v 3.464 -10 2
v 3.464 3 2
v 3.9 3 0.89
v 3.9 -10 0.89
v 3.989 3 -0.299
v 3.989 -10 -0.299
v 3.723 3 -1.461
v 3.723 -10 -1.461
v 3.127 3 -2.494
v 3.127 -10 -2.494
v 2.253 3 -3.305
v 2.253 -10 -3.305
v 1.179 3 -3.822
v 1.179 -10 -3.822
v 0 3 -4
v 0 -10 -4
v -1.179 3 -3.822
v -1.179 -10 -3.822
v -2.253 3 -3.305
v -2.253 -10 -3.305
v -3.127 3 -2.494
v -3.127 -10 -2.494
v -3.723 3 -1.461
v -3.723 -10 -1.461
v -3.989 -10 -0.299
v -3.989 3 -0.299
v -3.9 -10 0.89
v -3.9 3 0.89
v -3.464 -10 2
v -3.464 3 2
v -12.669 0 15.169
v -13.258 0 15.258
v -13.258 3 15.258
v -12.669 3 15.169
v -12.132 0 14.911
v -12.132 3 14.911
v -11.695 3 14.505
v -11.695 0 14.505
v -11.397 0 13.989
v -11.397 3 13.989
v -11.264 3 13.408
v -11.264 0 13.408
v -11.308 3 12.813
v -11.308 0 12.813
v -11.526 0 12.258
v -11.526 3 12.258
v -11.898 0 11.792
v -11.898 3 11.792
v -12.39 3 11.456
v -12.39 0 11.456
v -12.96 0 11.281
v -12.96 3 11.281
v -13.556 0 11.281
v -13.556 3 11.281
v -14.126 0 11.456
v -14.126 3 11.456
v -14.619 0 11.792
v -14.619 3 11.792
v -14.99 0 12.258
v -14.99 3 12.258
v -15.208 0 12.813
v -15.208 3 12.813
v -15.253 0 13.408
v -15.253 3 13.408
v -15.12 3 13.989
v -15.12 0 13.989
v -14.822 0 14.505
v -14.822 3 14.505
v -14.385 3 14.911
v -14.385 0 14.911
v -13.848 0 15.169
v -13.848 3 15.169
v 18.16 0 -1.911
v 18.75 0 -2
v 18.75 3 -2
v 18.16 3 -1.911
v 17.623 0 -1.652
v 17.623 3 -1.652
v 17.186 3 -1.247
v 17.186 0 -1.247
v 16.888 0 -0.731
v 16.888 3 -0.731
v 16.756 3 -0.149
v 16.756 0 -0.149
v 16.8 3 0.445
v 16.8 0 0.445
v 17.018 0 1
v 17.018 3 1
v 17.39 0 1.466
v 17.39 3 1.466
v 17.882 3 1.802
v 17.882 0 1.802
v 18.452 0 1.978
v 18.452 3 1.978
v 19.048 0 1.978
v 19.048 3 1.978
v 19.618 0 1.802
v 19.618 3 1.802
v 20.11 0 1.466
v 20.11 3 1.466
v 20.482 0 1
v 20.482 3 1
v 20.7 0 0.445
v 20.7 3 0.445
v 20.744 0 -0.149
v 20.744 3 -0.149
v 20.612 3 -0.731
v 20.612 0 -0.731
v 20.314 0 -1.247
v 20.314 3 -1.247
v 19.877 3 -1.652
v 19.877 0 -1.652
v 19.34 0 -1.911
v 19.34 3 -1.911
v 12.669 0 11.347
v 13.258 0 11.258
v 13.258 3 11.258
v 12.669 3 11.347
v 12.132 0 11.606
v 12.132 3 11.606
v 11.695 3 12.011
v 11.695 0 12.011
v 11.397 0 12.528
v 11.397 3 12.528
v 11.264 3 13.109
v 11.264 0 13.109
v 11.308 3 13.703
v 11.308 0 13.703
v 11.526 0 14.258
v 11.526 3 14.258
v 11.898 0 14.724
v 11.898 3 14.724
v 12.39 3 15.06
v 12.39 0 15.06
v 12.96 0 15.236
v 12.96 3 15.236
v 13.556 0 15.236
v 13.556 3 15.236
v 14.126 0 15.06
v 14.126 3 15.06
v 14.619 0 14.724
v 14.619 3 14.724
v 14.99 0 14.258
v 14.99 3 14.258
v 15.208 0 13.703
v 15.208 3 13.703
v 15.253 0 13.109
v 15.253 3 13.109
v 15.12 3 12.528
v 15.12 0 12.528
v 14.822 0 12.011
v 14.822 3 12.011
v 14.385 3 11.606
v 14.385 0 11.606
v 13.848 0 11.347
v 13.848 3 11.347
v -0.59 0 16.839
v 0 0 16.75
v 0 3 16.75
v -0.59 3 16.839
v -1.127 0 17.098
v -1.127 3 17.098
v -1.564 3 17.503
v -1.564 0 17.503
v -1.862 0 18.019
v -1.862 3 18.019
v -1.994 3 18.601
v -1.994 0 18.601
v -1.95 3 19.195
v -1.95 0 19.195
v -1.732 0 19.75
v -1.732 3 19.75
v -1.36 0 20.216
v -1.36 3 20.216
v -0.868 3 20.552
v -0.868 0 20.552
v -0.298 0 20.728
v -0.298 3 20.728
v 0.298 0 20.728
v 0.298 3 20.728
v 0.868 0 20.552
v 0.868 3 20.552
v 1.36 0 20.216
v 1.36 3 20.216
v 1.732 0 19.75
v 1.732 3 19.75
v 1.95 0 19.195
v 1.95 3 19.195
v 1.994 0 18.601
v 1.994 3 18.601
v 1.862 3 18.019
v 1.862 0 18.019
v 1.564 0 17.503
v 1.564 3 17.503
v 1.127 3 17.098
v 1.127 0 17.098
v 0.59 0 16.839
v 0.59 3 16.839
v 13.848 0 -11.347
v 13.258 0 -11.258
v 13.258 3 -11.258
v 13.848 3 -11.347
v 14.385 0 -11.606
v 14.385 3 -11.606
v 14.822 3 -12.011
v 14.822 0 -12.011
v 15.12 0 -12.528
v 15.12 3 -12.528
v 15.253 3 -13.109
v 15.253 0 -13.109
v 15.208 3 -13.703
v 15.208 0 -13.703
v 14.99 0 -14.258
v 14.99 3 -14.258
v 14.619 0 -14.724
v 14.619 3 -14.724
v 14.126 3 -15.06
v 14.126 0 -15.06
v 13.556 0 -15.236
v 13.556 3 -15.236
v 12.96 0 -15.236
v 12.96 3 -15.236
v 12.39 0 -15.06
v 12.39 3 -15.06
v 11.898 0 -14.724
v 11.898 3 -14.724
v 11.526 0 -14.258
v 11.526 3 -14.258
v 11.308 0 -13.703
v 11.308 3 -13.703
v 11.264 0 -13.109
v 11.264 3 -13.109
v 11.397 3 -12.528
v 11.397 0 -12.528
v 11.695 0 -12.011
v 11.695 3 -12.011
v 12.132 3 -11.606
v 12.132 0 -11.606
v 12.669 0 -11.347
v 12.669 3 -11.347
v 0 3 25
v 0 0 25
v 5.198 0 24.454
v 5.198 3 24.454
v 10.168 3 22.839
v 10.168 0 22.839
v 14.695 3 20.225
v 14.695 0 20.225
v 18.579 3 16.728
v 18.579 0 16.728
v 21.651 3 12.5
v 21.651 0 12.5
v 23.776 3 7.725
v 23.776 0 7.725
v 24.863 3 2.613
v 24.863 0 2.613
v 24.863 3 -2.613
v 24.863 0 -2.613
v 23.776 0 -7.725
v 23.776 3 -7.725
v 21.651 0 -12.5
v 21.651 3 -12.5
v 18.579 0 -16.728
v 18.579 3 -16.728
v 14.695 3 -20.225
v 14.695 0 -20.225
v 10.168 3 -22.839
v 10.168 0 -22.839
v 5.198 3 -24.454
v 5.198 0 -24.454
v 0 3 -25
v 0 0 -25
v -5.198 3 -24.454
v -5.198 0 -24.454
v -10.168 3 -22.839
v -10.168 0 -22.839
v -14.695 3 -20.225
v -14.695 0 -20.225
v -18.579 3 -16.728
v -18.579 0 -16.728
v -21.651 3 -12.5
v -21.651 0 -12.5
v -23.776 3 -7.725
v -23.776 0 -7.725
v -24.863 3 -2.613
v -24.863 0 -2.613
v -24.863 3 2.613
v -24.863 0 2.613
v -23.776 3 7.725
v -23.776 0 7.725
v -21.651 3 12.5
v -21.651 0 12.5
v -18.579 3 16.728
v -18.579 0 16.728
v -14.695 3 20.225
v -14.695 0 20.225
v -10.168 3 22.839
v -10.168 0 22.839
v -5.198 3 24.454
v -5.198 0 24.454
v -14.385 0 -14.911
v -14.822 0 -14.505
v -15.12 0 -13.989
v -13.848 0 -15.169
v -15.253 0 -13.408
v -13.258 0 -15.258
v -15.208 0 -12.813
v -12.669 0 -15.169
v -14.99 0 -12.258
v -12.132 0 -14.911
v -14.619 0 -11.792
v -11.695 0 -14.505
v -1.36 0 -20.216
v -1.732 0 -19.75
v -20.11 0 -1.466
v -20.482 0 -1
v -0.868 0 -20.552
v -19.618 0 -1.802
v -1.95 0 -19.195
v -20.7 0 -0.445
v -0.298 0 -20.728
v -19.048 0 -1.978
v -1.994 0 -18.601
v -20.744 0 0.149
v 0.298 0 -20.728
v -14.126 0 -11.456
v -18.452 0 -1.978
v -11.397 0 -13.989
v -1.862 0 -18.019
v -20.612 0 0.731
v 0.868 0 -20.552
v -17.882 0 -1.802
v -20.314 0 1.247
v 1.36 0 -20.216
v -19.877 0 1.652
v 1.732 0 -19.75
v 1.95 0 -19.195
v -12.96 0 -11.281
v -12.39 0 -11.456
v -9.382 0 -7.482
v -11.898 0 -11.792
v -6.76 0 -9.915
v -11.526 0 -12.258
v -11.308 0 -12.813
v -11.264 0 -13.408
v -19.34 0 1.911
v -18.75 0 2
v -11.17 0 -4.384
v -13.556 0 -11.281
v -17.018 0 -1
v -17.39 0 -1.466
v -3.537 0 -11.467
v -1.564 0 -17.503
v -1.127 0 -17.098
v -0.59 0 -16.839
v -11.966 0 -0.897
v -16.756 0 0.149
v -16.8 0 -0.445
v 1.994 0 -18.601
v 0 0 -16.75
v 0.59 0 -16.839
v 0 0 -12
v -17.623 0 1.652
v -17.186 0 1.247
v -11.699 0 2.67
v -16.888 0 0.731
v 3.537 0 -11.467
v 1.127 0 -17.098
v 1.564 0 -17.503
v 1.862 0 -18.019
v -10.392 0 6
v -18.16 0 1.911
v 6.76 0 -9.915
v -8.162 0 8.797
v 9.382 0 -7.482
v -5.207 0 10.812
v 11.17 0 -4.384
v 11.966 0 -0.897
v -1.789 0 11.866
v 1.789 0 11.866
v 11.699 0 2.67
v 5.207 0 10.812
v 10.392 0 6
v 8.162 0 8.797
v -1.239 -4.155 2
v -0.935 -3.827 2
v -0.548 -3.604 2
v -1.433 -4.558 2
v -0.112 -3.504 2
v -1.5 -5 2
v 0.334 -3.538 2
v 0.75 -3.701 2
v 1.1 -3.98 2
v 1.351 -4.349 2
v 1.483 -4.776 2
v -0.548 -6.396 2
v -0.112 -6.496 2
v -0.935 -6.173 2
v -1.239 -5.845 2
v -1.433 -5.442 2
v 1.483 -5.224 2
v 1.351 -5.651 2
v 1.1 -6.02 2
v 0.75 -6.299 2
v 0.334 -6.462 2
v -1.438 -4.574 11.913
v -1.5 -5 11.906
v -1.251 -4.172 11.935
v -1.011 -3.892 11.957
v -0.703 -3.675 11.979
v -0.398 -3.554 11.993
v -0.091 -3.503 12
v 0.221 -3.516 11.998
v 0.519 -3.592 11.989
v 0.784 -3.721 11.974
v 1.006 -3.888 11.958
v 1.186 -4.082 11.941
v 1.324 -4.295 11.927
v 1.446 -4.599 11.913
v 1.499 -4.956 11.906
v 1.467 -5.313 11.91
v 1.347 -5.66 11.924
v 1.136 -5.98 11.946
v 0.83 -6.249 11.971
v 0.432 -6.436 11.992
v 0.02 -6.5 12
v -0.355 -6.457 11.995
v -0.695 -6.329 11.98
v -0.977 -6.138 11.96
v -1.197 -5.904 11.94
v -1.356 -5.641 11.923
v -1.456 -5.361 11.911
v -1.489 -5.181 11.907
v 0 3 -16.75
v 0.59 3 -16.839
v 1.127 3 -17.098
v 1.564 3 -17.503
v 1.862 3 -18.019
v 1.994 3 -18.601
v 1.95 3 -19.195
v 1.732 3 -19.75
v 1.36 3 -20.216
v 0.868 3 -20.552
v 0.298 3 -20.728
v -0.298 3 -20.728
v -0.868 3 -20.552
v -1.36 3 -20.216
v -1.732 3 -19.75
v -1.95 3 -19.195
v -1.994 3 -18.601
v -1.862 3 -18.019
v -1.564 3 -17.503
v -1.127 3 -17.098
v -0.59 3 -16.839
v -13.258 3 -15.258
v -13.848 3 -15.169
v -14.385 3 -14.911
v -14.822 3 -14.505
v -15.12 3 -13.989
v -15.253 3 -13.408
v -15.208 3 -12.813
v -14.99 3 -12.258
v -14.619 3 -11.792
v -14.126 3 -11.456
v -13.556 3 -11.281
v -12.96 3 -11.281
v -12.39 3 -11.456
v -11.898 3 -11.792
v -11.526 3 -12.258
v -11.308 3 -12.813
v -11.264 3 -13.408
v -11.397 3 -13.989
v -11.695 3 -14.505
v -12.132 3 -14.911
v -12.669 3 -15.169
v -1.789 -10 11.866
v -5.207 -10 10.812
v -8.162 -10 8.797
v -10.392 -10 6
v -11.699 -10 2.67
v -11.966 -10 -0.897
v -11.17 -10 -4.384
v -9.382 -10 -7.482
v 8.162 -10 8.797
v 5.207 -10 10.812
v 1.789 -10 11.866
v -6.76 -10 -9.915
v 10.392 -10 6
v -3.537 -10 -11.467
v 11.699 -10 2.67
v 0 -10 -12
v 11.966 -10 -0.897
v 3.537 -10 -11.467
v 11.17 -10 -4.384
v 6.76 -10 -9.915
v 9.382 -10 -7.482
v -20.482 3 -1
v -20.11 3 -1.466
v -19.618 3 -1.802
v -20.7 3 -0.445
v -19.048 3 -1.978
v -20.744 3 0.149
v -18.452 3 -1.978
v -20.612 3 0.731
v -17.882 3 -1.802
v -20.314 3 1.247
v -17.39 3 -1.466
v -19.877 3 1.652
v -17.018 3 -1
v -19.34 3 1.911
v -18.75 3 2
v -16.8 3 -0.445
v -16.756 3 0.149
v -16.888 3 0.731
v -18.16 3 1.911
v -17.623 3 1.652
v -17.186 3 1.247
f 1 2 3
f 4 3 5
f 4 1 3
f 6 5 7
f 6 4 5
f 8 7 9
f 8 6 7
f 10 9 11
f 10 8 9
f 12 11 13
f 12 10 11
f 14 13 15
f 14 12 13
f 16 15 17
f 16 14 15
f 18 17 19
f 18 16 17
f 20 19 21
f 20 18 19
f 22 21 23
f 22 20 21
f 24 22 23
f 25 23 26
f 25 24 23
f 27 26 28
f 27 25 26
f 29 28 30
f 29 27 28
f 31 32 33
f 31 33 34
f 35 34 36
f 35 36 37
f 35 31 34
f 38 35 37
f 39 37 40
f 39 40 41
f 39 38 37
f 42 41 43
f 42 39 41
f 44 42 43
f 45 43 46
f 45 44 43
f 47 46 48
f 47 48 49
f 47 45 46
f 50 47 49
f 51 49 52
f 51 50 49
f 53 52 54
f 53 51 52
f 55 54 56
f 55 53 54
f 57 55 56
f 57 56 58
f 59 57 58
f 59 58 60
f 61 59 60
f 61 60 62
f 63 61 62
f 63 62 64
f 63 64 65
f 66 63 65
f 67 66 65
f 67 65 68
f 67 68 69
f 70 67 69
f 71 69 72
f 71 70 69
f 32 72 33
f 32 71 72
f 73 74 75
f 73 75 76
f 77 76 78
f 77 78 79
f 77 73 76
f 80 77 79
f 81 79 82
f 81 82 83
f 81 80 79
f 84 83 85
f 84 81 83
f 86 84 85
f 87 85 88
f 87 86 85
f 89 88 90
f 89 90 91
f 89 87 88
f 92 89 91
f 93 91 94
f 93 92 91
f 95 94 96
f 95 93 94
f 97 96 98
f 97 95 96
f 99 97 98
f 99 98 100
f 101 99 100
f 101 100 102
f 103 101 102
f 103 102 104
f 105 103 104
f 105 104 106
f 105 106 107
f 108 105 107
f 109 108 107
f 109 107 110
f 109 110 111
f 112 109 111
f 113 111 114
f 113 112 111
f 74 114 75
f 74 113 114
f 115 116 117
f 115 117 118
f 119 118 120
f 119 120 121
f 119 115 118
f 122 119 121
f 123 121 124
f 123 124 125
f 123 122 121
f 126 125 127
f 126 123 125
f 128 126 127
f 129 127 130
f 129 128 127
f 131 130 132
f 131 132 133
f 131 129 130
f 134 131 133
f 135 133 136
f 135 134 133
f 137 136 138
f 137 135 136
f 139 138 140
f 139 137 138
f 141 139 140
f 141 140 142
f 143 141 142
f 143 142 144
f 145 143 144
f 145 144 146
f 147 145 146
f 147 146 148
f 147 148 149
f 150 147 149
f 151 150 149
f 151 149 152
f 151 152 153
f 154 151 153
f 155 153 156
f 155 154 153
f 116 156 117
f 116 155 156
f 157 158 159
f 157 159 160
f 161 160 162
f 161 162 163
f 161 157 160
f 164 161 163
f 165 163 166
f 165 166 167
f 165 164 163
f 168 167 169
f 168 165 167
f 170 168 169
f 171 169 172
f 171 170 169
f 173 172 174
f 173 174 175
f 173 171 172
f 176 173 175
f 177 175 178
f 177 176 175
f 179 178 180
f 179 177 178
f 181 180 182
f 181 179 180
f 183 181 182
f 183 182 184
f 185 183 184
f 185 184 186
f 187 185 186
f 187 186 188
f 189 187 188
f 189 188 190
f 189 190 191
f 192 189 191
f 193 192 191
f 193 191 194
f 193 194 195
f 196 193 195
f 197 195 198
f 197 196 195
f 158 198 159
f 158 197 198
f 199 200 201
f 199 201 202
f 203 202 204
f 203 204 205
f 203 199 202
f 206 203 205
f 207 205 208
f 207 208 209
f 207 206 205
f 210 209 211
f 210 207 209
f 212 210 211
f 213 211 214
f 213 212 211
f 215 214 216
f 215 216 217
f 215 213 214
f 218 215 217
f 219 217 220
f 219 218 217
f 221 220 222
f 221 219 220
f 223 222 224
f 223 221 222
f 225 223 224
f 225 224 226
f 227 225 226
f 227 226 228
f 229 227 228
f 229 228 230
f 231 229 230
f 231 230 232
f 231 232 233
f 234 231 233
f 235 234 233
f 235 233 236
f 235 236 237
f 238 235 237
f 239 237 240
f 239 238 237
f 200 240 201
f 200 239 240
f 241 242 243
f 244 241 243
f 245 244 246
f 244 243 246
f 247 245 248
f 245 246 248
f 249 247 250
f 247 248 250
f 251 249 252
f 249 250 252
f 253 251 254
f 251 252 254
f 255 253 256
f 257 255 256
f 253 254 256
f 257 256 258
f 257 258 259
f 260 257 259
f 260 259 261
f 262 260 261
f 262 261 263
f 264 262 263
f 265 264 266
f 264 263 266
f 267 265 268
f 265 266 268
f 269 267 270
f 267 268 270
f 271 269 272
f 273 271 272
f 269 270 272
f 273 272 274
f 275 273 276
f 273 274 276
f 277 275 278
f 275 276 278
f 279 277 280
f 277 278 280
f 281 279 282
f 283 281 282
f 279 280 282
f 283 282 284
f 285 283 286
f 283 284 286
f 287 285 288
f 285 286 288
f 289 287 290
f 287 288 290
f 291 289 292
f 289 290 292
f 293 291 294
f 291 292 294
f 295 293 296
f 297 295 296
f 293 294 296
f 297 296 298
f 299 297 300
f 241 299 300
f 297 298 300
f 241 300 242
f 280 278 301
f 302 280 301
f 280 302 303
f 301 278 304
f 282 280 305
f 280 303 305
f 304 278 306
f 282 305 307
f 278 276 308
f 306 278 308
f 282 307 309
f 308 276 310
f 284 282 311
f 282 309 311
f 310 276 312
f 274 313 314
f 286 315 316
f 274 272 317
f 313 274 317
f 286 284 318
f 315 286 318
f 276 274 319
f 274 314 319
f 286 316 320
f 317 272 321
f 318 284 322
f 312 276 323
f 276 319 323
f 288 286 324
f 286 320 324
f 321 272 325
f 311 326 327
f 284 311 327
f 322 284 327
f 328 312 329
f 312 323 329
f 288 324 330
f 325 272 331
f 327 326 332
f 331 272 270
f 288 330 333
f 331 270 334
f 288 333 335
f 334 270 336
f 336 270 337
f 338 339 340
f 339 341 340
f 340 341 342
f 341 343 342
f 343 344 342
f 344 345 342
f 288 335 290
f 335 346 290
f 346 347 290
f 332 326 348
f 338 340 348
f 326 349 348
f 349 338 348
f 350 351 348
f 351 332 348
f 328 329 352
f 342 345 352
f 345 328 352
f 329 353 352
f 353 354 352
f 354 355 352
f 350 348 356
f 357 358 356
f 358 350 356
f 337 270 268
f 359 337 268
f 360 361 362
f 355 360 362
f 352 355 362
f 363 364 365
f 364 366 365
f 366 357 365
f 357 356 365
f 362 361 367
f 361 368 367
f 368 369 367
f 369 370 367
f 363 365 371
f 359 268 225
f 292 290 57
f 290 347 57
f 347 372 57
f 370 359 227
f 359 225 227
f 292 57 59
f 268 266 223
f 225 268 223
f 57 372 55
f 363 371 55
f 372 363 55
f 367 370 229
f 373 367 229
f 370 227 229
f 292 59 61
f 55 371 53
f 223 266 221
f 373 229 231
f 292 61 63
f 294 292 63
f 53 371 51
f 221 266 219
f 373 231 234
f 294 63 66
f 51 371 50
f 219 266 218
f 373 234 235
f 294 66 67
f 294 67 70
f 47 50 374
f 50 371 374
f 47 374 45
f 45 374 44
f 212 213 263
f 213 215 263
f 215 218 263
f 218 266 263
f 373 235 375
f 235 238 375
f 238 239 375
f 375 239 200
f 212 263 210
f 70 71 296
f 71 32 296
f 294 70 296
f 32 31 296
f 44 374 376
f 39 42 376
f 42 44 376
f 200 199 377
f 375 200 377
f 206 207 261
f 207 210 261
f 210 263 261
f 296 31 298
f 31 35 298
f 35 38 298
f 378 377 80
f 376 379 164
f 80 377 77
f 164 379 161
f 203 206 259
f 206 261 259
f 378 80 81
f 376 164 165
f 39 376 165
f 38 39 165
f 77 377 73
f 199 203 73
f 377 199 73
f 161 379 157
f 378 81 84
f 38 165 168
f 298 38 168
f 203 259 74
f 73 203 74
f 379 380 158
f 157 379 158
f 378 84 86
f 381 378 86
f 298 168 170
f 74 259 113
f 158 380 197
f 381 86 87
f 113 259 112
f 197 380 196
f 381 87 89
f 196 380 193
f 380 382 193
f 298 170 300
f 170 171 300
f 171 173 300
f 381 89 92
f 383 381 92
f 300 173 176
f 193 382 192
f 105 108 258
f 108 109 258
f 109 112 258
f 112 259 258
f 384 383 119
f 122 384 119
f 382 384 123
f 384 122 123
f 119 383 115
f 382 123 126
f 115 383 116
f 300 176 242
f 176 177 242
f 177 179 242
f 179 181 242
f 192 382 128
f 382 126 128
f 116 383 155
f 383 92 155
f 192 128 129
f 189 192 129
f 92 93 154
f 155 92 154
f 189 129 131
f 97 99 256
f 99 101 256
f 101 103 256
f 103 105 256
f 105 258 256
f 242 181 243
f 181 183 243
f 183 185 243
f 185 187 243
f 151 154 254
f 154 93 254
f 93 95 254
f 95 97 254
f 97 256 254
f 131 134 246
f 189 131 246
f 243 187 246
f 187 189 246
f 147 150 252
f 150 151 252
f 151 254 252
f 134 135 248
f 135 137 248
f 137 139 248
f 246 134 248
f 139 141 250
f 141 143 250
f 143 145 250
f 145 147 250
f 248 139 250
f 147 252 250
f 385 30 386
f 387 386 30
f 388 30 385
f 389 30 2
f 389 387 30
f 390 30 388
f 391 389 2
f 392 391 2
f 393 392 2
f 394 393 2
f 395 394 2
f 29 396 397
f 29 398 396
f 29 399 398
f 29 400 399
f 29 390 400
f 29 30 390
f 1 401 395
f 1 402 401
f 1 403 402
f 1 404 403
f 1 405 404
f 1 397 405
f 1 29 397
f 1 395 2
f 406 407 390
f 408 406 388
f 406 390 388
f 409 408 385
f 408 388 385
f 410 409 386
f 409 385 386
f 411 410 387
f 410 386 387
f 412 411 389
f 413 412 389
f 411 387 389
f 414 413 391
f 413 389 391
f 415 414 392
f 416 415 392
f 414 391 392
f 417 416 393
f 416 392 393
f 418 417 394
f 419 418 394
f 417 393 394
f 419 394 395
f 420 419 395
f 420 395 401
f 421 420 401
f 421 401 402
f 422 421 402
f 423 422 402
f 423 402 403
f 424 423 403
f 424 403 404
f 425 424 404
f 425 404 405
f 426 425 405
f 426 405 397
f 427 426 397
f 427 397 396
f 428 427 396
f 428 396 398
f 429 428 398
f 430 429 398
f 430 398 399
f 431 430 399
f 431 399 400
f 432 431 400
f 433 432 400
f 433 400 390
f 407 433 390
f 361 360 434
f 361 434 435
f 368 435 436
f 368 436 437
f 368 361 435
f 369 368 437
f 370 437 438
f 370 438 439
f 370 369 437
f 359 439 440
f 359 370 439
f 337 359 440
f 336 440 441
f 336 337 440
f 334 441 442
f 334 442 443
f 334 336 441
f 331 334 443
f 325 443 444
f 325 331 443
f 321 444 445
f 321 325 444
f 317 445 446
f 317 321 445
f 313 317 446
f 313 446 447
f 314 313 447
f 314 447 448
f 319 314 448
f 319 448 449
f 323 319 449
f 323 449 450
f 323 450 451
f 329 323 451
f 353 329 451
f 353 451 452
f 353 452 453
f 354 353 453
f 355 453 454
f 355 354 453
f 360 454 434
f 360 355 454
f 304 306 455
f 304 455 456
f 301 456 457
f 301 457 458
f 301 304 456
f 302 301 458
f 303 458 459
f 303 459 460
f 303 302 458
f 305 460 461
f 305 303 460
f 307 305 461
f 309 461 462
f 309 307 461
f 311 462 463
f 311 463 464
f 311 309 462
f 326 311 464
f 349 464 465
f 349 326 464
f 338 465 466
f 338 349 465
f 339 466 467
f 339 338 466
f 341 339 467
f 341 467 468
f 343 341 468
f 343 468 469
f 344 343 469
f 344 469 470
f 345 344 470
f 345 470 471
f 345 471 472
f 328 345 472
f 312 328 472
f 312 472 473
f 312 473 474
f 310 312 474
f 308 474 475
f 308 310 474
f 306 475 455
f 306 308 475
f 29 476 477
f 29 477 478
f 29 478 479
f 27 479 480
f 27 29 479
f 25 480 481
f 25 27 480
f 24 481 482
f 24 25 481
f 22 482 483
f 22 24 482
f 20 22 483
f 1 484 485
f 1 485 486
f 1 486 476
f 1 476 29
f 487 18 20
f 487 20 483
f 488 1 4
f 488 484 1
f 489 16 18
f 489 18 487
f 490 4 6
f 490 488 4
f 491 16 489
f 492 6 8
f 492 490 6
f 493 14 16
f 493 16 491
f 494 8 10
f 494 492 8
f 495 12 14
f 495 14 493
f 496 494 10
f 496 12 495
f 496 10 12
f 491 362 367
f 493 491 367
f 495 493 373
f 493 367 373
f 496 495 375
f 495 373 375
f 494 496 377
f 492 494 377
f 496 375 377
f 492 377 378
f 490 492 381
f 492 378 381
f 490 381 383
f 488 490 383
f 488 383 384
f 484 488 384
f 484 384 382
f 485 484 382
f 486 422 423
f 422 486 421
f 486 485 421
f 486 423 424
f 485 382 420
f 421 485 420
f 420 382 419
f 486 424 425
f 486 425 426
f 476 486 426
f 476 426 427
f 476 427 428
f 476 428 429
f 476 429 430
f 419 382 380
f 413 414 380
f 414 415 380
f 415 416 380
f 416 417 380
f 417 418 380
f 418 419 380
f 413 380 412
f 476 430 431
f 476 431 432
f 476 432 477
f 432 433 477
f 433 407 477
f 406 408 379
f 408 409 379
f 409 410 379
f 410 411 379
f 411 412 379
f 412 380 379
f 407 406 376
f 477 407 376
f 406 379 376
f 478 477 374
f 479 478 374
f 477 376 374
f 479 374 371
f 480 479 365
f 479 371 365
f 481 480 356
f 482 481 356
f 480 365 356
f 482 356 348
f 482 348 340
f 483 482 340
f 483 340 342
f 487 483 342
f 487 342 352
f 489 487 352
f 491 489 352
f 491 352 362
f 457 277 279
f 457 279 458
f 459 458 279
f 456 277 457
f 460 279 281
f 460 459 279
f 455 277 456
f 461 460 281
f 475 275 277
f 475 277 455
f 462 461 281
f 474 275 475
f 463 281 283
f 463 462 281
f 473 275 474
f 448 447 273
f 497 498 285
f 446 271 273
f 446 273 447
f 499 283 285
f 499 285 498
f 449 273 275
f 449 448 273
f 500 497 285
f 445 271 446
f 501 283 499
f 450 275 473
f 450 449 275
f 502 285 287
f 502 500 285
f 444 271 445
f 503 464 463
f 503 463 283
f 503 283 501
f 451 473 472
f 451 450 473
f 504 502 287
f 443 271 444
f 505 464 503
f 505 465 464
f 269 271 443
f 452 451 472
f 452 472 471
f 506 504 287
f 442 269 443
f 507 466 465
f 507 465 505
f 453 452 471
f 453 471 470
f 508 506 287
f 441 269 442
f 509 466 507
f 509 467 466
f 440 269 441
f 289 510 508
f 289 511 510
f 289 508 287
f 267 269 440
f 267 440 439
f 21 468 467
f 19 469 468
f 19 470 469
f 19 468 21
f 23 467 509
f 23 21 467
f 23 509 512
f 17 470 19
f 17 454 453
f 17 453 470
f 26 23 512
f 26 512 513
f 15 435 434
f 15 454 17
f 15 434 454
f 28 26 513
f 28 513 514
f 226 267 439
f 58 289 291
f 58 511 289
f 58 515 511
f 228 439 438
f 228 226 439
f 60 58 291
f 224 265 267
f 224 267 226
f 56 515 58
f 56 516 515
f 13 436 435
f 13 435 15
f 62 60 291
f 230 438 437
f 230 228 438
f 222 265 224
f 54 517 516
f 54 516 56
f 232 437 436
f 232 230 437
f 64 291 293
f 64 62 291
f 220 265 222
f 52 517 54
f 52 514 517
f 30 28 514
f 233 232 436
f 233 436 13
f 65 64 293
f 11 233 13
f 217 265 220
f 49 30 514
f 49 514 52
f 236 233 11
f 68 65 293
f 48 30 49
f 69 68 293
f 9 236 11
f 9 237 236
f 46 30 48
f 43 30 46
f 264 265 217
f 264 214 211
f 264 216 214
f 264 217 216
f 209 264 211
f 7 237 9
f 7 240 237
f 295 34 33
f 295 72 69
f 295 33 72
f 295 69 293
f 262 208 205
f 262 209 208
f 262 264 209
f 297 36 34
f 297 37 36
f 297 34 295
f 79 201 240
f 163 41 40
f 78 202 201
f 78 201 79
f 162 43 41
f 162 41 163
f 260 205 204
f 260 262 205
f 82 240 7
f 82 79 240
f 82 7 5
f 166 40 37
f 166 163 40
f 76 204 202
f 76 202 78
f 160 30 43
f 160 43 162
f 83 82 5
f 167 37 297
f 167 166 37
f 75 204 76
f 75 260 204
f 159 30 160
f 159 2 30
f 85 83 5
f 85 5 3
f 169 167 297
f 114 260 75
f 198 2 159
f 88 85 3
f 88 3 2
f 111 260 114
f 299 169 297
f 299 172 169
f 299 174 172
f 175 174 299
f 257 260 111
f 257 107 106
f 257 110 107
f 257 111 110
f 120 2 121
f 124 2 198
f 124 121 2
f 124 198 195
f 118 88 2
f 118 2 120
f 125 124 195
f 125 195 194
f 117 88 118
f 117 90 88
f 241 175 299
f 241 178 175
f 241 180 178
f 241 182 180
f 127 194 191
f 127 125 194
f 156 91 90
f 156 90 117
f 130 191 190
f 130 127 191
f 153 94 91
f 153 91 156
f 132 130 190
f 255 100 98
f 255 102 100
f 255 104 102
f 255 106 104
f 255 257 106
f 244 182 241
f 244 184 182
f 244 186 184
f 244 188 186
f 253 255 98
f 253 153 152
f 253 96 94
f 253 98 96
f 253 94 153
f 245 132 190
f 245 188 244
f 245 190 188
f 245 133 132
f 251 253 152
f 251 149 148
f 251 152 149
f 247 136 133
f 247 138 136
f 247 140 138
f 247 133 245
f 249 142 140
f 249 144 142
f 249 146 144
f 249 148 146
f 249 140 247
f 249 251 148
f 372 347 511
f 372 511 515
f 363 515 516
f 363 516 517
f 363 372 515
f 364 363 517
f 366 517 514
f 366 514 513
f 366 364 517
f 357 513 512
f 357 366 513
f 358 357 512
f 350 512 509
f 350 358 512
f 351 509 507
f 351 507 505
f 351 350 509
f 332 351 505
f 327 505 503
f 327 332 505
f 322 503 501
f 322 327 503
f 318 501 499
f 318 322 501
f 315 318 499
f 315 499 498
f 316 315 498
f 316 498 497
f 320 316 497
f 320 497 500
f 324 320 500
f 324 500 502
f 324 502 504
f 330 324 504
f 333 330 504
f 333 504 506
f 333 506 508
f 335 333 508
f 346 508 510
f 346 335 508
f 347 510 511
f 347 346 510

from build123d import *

# Parameters (mm, degrees)
SKETCH_1_R          = 25
SKETCH_1_R_2        = 2
EXTRUDE_1_DEPTH     = 3
SKETCH_2_R          = 12
EXTRUDE_2_DEPTH     = 10
CUT_EXTRUDE_1_DEPTH = 38.669616404
SKETCH_4_R          = 1.5
CUT_EXTRUDE_2_DEPTH = 39.13135193


with BuildPart() as part:
    # 草图1 → 凸台-拉伸1 (new body)
    with BuildSketch(Plane(origin=(0, 0, 0), x_dir=(1, 0, 0), z_dir=(0, 1, 0))):
        with Locations(Location((0, 0, 0), (0, 0, 270))):
            Circle(SKETCH_1_R)
        with Locations(Location((-18.75, 0, 0), (0, 0, 270))):
            Circle(SKETCH_1_R_2, mode=Mode.SUBTRACT)
        with Locations(Location((0, -18.75, 0), (0, 0, 90))):
            Circle(SKETCH_1_R_2, mode=Mode.SUBTRACT)
        with Locations(Location((-13.258252147, -13.258252147, 0), (0, 0, 270))):
            Circle(SKETCH_1_R_2, mode=Mode.SUBTRACT)
        with Locations(Location((0, 18.75, 0), (0, 0, 270))):
            Circle(SKETCH_1_R_2, mode=Mode.SUBTRACT)
        with Locations(Location((-13.258252147, 13.258252147, 0), (0, 0, 90))):
            Circle(SKETCH_1_R_2, mode=Mode.SUBTRACT)
        with Locations(Location((13.258252147, 13.258252147, 0), (0, 0, 270))):
            Circle(SKETCH_1_R_2, mode=Mode.SUBTRACT)
        with Locations(Location((18.75, 0, 0), (0, 0, 90))):
            Circle(SKETCH_1_R_2, mode=Mode.SUBTRACT)
        with Locations(Location((13.258252147, -13.258252147, 0), (0, 0, 90))):
            Circle(SKETCH_1_R_2, mode=Mode.SUBTRACT)
    extrude(amount=EXTRUDE_1_DEPTH)

    # 草图2 → 凸台-拉伸2 (add)
    with BuildSketch(Plane.XZ):
        with Locations(Location((0, 0, 0), (0, 0, 270))):
            Circle(SKETCH_2_R)
    extrude(amount=EXTRUDE_2_DEPTH)

    # 草图3 → 切除-拉伸1 (cut, through all)
    with BuildSketch(Plane.XZ.offset(10)):
        with BuildLine():
            Line((-3.464101615, 2), (3.464101615, 2))
            ThreePointArc((3.464101615, 2), (0, -4), (-3.464101615, 2))
        make_face()
    extrude(amount=-CUT_EXTRUDE_1_DEPTH, mode=Mode.SUBTRACT)

    # 草图4 → 切除-拉伸2 (cut, through all)
    with BuildSketch(Plane(origin=(0, 0, 2), x_dir=(-1, 0, 0), z_dir=(0, 0, -1))):
        with Locations((0, -5)):
            Circle(SKETCH_4_R)
    extrude(amount=-CUT_EXTRUDE_2_DEPTH, mode=Mode.SUBTRACT)


solid = part.part
